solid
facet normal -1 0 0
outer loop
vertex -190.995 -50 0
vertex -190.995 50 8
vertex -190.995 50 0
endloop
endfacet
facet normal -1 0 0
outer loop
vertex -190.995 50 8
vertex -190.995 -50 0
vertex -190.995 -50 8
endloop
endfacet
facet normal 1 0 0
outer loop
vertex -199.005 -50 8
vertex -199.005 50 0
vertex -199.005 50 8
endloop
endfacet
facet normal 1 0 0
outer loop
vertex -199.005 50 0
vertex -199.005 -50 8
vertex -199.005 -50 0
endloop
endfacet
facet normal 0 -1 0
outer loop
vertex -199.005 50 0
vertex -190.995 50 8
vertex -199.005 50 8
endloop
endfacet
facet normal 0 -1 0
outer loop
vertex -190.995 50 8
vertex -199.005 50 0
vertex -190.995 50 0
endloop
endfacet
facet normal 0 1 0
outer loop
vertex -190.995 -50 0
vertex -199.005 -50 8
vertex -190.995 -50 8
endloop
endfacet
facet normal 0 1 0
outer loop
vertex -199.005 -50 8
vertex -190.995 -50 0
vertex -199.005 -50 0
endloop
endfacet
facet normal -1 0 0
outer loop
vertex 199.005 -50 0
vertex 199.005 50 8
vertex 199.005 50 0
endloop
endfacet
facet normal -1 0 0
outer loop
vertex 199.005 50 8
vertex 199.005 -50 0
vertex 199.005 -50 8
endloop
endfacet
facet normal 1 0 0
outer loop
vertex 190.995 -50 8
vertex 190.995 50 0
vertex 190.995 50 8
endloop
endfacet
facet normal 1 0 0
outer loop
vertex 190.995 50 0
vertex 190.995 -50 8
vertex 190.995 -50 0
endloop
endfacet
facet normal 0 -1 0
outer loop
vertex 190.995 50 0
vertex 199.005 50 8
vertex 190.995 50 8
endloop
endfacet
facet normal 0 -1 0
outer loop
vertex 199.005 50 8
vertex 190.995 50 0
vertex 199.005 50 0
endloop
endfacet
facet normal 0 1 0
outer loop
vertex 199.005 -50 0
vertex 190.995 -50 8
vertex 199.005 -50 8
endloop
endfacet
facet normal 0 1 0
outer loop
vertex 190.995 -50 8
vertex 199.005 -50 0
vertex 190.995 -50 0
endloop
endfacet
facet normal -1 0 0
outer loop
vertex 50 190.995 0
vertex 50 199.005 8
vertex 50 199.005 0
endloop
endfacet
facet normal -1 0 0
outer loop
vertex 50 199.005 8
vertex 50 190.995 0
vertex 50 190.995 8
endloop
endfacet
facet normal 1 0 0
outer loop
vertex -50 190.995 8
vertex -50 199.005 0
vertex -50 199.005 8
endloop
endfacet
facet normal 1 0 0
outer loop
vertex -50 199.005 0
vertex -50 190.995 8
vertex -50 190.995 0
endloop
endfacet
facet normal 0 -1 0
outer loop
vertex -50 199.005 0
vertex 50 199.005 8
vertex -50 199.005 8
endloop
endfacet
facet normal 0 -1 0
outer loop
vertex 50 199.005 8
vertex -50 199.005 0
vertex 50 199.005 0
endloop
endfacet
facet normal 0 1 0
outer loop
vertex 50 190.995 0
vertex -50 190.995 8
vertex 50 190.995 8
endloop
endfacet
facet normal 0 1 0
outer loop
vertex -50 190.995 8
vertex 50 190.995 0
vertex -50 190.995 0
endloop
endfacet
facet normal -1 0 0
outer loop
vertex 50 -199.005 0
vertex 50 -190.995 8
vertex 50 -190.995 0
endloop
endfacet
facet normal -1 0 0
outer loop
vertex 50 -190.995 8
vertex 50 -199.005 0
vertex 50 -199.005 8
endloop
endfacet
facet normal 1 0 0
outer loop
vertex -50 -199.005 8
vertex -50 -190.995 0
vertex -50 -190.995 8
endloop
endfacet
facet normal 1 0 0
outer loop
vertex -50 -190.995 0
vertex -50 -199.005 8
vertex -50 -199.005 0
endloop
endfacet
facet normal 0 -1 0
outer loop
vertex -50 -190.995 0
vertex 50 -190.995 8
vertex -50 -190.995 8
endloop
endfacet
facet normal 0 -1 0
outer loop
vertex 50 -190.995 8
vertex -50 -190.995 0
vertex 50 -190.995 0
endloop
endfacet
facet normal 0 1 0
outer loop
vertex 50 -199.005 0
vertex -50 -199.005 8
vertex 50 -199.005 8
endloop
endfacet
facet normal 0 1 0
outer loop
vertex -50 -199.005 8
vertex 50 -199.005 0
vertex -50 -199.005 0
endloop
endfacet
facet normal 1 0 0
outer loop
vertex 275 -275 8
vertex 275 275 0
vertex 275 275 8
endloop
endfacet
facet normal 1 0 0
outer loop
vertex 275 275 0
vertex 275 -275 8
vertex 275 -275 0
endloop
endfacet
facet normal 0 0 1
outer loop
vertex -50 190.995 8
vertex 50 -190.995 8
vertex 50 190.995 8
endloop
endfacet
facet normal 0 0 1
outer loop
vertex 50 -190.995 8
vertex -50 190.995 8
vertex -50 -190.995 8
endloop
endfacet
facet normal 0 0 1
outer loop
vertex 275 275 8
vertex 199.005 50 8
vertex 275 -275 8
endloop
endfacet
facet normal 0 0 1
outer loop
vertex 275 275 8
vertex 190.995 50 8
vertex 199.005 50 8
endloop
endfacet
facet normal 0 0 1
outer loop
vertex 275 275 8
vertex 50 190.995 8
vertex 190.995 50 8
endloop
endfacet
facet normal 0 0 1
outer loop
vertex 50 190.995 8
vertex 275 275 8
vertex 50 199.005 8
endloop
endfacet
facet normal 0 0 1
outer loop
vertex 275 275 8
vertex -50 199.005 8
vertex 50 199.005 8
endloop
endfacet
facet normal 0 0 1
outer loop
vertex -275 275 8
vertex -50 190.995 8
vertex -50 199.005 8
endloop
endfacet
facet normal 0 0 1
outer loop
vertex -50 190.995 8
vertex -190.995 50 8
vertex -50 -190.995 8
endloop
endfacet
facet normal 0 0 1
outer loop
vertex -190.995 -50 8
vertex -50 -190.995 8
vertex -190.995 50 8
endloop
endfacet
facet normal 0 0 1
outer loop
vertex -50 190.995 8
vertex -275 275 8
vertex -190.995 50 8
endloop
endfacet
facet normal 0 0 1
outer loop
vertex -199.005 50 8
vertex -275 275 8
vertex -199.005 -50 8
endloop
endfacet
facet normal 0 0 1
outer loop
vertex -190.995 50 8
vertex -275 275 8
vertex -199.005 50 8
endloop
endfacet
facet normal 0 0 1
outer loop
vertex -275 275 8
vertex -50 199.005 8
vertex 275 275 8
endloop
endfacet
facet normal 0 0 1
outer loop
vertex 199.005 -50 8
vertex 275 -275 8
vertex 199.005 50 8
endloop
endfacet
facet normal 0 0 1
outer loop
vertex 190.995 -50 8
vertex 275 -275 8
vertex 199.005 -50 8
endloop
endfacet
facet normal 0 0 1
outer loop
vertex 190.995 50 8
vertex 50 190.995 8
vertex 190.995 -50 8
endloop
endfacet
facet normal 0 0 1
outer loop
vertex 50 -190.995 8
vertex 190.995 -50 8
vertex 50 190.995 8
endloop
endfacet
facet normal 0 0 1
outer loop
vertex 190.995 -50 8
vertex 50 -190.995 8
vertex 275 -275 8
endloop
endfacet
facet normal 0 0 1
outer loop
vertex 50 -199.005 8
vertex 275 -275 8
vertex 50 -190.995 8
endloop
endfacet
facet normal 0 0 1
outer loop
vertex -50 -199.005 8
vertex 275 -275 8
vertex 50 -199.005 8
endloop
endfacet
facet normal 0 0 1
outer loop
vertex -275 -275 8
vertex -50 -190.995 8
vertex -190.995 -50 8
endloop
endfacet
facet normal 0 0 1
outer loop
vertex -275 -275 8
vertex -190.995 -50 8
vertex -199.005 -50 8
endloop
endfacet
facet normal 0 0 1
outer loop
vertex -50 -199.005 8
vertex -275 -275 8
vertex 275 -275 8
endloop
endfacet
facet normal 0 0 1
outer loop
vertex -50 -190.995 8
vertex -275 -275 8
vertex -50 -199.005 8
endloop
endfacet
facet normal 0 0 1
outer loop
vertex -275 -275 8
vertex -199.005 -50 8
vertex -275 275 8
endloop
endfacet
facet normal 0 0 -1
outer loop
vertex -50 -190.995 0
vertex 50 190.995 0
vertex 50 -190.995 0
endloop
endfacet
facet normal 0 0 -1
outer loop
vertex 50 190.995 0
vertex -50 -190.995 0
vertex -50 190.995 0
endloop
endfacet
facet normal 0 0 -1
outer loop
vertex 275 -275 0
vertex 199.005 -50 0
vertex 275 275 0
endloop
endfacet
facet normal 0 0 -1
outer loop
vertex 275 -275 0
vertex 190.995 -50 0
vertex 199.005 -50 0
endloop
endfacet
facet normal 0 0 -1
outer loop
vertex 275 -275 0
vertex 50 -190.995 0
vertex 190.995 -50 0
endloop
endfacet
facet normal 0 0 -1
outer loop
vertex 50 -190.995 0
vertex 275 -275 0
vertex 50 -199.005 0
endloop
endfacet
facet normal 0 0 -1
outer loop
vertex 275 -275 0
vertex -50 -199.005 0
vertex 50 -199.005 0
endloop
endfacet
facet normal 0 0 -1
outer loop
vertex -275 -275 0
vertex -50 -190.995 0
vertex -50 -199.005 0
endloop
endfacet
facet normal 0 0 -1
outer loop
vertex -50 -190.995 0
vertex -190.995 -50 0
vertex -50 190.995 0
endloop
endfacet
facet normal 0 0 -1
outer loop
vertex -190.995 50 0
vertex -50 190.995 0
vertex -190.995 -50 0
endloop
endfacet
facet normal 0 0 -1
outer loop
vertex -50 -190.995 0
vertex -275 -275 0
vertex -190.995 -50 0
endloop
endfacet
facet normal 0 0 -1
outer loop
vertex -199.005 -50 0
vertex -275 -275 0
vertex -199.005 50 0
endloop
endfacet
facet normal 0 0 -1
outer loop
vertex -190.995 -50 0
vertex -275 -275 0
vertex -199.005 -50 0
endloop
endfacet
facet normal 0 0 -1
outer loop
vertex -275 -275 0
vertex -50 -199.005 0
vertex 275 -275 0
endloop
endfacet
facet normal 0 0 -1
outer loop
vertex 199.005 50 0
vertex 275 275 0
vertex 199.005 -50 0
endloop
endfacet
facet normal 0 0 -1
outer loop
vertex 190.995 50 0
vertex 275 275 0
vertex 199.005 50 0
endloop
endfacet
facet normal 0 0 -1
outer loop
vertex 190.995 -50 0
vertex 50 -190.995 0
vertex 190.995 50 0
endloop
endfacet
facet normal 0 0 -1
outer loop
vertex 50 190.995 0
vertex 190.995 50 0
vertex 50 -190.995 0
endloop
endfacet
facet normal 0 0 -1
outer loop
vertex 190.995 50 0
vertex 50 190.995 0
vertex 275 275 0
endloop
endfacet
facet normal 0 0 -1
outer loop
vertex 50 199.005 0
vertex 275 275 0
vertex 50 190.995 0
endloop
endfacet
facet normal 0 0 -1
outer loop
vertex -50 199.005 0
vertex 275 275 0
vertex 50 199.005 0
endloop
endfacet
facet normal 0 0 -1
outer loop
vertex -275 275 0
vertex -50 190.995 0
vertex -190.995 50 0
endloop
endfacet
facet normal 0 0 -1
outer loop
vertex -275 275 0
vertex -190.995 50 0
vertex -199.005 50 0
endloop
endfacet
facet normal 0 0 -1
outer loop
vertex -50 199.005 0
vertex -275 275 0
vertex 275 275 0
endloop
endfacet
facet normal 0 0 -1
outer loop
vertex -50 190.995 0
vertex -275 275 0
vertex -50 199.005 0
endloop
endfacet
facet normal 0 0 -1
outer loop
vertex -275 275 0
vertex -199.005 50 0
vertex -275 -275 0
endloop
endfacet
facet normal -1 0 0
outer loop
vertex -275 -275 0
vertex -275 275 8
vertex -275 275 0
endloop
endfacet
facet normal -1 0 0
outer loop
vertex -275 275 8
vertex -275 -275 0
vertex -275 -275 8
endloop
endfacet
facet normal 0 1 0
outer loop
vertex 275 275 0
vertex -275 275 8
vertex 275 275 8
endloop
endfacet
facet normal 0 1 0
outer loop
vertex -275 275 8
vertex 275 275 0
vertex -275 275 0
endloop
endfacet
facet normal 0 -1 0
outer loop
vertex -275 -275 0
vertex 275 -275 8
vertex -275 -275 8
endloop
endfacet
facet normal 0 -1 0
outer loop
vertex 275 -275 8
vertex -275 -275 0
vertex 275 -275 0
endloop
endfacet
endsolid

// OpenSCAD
// file: global.scad
// all measures in mm

$fn = 100;
nothing = 0.01;

material_x = 510;
material_y = 370;
material_width = 8;

// Measures of the top plate
top_x = 550;
top_y = 550;

// Leg measurements
leg_x = 450;
leg_z = 950;

// about hoch much the faces in Y direction are inset
face_y_inset = 30;

// how far the joint extends planarly from the face
joint_x = 30;

// Assume same material measure as for X plane
leg_y = leg_x - joint_x*2;

// the lateral width of the joint
joint_y = 50;
// how far down the hook extends
joint_hook_y = 50;

joint_total_height = joint_y + joint_hook_y;

num_joints = 4;
q = leg_z/(num_joints+1);
joint_height = [q, 2*q, 3*q, 4*q];

nose_width = 100;
nose_z = material_width;

// how far apart from on another to project the parts
projection_spacing = 1;
// main file
include <global.scad>;

module top()
{
    color("blue")
    difference()
    {
        translate([
            0,
            0,
            material_width/2
            ])
        cube([
            top_x,
            top_y,
            material_width
            ], center=true);

        for (x=[
                -leg_x/2 + face_y_inset,
                +leg_x/2 - face_y_inset,
                ])
        {
            translate([x, 0, 0])
            cube([
                material_width + nothing,
                nose_width,
                material_width*3
                ], center=true);
        }

        for (y=[
                +leg_y/2,
                -leg_y/2
                ])
        {
            translate([0, y, 0])
            cube([
                nose_width,
                material_width + nothing,
                material_width*3
                ], center=true);
        }
    }
}

top();
